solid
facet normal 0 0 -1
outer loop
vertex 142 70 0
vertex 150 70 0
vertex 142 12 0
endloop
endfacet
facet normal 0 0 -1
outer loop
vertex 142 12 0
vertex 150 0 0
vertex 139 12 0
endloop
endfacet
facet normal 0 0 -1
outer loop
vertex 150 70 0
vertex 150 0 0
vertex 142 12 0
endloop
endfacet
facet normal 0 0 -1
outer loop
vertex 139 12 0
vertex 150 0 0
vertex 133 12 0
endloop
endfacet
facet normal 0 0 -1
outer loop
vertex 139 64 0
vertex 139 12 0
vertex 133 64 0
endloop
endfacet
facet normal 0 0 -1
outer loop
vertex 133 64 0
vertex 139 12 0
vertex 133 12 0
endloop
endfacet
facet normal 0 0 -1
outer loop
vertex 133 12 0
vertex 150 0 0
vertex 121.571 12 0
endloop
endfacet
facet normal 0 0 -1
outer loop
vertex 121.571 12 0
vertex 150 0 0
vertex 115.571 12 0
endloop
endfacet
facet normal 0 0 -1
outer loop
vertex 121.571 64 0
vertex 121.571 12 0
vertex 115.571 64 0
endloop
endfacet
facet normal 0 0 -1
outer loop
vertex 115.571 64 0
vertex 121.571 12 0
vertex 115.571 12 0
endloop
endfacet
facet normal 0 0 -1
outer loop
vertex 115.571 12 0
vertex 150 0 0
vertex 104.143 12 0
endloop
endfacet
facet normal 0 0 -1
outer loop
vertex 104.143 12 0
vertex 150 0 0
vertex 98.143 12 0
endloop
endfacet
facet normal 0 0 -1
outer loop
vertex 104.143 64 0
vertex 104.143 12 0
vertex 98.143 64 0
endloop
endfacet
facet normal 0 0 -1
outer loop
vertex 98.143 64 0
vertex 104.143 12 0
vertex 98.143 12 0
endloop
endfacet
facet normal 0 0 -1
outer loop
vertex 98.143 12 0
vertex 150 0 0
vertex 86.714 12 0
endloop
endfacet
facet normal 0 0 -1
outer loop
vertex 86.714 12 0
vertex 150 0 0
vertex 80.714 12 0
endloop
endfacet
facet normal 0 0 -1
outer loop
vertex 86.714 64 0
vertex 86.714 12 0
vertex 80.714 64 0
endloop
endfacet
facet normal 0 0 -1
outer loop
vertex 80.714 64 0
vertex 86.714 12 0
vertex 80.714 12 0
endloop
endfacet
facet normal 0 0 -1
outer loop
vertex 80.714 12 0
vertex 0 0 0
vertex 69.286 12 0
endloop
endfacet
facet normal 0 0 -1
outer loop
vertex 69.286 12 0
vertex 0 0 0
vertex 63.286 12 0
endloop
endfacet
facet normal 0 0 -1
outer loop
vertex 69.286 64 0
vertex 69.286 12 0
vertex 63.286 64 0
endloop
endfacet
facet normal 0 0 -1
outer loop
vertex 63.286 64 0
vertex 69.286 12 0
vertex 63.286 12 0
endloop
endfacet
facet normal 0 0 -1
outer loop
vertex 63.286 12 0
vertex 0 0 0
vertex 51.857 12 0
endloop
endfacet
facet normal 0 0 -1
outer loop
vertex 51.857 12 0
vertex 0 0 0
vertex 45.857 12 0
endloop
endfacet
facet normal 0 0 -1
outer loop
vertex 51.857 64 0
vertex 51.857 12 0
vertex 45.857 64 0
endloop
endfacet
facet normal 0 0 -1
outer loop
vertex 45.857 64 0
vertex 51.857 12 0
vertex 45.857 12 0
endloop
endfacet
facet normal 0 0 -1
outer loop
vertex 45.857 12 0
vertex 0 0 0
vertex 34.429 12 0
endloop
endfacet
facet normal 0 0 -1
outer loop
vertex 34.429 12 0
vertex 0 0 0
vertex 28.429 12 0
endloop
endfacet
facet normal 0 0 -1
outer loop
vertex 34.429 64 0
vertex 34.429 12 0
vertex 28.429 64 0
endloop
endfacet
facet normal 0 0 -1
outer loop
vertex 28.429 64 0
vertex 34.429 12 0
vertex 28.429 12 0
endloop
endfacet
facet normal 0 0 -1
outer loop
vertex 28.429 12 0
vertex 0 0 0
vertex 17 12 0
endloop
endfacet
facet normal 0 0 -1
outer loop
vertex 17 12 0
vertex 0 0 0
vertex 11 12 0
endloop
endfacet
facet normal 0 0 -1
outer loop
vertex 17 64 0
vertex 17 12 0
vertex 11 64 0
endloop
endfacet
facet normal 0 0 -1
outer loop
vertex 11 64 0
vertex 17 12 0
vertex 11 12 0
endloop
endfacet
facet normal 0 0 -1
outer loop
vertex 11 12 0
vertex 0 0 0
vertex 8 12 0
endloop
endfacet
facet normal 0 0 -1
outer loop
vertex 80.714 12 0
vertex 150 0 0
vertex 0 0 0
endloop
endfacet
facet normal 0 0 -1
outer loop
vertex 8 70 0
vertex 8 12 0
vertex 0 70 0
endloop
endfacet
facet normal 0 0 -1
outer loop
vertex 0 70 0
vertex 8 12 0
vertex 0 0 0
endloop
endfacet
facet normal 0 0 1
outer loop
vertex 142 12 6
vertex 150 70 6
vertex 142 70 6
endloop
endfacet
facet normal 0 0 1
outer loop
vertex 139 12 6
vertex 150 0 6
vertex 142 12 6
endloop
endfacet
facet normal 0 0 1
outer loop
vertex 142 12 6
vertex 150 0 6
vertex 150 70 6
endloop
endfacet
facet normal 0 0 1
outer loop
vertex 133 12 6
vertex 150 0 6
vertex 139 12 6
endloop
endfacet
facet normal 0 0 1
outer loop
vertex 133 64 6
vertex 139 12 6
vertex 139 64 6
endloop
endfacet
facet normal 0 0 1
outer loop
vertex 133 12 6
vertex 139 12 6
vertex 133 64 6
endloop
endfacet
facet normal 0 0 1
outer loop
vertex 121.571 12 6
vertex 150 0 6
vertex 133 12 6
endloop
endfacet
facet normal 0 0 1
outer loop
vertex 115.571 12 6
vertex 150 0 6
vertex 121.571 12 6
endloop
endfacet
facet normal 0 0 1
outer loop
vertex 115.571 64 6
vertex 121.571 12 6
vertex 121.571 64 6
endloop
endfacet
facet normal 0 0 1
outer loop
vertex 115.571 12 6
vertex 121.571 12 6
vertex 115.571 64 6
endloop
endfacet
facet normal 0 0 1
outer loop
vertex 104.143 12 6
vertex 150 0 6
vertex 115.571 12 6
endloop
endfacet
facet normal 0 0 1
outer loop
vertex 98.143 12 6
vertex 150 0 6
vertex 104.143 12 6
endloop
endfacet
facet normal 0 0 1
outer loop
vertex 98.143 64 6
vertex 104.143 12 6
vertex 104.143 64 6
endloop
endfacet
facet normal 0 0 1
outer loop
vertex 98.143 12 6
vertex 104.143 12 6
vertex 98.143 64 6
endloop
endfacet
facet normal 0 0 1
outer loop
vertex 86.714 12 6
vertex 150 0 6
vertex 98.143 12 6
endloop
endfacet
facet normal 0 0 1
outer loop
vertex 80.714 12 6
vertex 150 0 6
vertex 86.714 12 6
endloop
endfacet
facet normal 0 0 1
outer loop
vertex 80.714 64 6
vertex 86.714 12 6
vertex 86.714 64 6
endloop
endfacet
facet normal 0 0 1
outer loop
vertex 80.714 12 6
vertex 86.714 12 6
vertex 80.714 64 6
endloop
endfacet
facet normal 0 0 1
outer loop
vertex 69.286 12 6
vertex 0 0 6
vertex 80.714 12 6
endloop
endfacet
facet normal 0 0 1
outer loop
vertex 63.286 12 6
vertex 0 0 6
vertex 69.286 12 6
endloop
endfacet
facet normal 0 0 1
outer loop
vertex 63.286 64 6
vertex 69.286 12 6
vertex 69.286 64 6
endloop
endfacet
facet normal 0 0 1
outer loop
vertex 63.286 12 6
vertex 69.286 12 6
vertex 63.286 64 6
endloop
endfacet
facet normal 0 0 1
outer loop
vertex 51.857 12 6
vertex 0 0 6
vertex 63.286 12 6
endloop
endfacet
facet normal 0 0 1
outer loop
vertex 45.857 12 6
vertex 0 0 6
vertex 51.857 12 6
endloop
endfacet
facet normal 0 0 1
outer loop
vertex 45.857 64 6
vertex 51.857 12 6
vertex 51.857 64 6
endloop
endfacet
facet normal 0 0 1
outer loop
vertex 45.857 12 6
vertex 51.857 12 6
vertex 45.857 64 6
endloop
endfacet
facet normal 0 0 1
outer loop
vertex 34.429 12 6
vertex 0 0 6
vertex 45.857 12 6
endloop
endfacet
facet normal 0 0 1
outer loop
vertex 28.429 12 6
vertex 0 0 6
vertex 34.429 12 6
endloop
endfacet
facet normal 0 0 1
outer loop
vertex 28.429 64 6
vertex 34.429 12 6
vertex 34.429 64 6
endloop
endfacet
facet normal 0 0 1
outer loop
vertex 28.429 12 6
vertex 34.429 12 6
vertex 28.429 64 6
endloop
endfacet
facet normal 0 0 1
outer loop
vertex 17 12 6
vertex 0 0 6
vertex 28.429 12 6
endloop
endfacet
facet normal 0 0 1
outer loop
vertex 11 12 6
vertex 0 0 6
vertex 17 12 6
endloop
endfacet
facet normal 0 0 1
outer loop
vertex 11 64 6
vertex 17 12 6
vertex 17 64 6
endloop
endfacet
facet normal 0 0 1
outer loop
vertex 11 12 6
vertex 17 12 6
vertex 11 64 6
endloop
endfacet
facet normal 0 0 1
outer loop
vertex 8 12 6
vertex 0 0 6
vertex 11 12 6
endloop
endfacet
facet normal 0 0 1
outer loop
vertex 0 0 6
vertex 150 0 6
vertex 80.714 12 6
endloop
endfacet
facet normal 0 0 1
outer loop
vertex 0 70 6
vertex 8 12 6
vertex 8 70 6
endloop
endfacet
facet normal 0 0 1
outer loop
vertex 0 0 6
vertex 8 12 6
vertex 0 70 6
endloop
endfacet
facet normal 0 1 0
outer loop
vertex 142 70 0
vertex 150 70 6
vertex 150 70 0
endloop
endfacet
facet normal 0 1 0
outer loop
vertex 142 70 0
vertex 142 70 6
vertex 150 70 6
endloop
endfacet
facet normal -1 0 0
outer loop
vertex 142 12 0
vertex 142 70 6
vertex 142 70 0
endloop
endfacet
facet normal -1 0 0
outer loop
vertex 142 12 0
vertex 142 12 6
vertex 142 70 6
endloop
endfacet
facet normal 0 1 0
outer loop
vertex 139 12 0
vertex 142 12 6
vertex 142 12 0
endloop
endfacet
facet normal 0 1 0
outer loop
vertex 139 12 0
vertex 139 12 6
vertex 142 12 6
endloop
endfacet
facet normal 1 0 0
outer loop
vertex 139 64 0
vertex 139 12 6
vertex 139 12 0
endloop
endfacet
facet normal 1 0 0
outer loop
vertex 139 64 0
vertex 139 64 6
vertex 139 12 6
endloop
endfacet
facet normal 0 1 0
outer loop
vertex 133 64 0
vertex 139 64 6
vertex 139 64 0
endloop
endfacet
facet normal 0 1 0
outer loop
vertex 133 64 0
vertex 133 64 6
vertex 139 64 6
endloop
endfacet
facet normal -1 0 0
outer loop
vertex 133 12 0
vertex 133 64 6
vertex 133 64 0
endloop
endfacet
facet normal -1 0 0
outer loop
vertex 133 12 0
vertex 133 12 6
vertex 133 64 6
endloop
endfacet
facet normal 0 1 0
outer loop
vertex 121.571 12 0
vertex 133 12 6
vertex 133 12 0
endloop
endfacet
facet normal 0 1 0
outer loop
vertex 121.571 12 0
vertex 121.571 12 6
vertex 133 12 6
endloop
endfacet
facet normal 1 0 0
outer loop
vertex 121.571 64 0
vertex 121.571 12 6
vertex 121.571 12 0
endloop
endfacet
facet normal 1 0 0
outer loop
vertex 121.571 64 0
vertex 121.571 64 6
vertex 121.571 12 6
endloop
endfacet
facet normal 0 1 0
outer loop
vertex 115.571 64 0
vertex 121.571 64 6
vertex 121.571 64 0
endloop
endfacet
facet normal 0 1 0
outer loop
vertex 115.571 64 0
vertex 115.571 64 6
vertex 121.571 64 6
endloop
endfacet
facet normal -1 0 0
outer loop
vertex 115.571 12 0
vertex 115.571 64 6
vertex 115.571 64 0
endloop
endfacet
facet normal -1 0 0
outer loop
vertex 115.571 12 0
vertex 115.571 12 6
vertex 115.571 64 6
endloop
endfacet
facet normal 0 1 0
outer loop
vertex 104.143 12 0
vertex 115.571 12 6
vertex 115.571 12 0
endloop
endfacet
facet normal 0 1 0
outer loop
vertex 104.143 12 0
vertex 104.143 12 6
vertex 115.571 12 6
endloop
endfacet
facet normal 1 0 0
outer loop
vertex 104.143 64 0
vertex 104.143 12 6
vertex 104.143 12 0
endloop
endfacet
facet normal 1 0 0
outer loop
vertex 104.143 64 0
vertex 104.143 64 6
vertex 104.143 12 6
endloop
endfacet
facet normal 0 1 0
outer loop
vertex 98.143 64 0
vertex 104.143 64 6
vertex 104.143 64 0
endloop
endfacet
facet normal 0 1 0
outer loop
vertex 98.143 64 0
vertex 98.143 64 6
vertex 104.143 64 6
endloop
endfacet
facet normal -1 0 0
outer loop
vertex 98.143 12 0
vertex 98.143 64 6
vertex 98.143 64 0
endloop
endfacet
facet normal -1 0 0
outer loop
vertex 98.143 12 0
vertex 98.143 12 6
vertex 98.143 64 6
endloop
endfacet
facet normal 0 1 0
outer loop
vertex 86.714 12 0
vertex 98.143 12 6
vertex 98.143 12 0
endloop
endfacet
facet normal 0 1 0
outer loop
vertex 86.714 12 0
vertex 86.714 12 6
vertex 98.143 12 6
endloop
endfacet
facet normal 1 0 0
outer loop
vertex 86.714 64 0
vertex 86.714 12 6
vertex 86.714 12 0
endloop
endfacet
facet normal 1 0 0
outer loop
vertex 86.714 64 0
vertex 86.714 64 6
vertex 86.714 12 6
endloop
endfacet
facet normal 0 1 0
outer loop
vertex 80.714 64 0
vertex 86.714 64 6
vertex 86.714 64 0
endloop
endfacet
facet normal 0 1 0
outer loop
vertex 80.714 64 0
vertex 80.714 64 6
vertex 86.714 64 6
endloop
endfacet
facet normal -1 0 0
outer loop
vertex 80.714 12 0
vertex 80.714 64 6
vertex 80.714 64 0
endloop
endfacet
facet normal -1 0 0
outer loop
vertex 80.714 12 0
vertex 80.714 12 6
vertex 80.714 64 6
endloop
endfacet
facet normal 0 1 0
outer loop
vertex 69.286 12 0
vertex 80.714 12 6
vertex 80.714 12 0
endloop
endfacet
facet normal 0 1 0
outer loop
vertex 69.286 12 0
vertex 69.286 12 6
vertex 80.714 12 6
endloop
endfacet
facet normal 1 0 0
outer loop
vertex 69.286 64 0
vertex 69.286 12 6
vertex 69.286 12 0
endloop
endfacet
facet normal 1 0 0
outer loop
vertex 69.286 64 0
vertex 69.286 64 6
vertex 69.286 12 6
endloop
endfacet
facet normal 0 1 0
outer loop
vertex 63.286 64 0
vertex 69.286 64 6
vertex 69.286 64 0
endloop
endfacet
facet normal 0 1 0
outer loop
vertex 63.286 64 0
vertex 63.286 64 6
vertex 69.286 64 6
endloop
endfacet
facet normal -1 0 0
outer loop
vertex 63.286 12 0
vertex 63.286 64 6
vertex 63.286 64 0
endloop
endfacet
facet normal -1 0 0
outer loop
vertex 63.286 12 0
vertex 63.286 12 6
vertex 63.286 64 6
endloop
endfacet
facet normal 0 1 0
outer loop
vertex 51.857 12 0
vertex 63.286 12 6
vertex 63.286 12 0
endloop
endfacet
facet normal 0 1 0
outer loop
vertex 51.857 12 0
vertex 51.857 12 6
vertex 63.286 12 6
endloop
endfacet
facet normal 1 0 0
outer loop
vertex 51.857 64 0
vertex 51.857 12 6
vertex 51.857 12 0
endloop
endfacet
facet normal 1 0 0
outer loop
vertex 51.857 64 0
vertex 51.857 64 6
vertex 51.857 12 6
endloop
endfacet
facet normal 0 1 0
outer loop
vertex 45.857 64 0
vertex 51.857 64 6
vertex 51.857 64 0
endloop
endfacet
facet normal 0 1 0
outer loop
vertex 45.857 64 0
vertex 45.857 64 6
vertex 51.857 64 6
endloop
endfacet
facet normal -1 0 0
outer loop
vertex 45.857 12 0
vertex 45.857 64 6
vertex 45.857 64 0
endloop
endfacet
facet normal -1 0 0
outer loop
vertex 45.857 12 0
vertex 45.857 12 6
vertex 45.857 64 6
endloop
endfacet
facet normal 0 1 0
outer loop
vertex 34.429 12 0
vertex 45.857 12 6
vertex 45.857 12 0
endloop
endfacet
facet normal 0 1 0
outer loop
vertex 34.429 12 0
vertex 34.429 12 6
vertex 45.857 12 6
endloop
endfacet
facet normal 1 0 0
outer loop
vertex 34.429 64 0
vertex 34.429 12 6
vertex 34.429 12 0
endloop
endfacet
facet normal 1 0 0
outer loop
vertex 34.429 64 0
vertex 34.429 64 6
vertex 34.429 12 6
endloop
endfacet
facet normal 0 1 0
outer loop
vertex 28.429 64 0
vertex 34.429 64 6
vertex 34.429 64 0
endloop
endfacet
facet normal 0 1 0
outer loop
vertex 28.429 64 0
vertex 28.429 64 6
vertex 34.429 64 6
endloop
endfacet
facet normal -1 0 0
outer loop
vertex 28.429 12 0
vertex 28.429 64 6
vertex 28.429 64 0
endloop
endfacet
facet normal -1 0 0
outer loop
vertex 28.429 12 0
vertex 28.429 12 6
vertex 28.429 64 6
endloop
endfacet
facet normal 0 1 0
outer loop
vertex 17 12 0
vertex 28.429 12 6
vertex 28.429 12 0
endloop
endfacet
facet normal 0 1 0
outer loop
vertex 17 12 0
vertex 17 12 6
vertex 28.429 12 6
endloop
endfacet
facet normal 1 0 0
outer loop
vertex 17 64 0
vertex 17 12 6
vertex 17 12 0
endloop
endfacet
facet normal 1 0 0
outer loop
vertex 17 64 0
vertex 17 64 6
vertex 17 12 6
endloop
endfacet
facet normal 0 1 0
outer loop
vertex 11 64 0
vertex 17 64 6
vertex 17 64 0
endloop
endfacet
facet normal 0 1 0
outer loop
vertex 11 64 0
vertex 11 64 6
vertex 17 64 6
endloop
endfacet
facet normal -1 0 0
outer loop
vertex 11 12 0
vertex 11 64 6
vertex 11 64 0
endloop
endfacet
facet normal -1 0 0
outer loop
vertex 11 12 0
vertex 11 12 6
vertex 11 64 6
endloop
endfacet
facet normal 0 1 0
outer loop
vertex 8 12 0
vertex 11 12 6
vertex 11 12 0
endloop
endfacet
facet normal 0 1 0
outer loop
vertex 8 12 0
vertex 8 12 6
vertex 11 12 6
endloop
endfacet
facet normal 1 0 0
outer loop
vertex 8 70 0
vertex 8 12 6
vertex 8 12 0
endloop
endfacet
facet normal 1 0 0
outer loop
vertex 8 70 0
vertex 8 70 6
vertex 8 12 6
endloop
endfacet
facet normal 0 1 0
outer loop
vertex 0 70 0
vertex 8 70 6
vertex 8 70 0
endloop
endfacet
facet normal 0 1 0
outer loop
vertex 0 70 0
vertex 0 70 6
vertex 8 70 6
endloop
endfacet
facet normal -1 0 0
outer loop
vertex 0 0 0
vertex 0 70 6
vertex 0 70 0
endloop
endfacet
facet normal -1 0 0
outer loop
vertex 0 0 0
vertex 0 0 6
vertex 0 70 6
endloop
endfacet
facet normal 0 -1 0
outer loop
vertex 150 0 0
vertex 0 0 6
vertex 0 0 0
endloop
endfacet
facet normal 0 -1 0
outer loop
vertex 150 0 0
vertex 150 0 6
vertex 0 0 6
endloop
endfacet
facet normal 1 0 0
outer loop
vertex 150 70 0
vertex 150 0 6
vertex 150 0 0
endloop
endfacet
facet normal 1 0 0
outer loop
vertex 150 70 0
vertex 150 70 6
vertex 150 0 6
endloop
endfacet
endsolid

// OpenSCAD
$fn = 32;

// ----------------------------------------------------------------------
// Guard grille: 8 slats over a 150 x 70 mm plate
// ----------------------------------------------------------------------

// --- parameters (mm) ---
profile_height = 6;       // extrusion height
profile_points = 40;      // points of the closed outline

profile = [[0, 0], [150, 0], [150, 70], [142, 70], [142, 12], [139, 12], [139, 64], [133, 64], [133, 12], [121.571, 12], [121.571, 64], [115.571, 64], [115.571, 12], [104.143, 12], [104.143, 64], [98.143, 64], [98.143, 12], [86.714, 12], [86.714, 64], [80.714, 64], [80.714, 12], [69.286, 12], [69.286, 64], [63.286, 64], [63.286, 12], [51.857, 12], [51.857, 64], [45.857, 64], [45.857, 12], [34.429, 12], [34.429, 64], [28.429, 64], [28.429, 12], [17, 12], [17, 64], [11, 64], [11, 12], [8, 12], [8, 70], [0, 70]];  // single closed polygon, 40 points, counter clockwise

// --- the one profile operation ---
linear_extrude(height = profile_height) polygon(points = profile);
